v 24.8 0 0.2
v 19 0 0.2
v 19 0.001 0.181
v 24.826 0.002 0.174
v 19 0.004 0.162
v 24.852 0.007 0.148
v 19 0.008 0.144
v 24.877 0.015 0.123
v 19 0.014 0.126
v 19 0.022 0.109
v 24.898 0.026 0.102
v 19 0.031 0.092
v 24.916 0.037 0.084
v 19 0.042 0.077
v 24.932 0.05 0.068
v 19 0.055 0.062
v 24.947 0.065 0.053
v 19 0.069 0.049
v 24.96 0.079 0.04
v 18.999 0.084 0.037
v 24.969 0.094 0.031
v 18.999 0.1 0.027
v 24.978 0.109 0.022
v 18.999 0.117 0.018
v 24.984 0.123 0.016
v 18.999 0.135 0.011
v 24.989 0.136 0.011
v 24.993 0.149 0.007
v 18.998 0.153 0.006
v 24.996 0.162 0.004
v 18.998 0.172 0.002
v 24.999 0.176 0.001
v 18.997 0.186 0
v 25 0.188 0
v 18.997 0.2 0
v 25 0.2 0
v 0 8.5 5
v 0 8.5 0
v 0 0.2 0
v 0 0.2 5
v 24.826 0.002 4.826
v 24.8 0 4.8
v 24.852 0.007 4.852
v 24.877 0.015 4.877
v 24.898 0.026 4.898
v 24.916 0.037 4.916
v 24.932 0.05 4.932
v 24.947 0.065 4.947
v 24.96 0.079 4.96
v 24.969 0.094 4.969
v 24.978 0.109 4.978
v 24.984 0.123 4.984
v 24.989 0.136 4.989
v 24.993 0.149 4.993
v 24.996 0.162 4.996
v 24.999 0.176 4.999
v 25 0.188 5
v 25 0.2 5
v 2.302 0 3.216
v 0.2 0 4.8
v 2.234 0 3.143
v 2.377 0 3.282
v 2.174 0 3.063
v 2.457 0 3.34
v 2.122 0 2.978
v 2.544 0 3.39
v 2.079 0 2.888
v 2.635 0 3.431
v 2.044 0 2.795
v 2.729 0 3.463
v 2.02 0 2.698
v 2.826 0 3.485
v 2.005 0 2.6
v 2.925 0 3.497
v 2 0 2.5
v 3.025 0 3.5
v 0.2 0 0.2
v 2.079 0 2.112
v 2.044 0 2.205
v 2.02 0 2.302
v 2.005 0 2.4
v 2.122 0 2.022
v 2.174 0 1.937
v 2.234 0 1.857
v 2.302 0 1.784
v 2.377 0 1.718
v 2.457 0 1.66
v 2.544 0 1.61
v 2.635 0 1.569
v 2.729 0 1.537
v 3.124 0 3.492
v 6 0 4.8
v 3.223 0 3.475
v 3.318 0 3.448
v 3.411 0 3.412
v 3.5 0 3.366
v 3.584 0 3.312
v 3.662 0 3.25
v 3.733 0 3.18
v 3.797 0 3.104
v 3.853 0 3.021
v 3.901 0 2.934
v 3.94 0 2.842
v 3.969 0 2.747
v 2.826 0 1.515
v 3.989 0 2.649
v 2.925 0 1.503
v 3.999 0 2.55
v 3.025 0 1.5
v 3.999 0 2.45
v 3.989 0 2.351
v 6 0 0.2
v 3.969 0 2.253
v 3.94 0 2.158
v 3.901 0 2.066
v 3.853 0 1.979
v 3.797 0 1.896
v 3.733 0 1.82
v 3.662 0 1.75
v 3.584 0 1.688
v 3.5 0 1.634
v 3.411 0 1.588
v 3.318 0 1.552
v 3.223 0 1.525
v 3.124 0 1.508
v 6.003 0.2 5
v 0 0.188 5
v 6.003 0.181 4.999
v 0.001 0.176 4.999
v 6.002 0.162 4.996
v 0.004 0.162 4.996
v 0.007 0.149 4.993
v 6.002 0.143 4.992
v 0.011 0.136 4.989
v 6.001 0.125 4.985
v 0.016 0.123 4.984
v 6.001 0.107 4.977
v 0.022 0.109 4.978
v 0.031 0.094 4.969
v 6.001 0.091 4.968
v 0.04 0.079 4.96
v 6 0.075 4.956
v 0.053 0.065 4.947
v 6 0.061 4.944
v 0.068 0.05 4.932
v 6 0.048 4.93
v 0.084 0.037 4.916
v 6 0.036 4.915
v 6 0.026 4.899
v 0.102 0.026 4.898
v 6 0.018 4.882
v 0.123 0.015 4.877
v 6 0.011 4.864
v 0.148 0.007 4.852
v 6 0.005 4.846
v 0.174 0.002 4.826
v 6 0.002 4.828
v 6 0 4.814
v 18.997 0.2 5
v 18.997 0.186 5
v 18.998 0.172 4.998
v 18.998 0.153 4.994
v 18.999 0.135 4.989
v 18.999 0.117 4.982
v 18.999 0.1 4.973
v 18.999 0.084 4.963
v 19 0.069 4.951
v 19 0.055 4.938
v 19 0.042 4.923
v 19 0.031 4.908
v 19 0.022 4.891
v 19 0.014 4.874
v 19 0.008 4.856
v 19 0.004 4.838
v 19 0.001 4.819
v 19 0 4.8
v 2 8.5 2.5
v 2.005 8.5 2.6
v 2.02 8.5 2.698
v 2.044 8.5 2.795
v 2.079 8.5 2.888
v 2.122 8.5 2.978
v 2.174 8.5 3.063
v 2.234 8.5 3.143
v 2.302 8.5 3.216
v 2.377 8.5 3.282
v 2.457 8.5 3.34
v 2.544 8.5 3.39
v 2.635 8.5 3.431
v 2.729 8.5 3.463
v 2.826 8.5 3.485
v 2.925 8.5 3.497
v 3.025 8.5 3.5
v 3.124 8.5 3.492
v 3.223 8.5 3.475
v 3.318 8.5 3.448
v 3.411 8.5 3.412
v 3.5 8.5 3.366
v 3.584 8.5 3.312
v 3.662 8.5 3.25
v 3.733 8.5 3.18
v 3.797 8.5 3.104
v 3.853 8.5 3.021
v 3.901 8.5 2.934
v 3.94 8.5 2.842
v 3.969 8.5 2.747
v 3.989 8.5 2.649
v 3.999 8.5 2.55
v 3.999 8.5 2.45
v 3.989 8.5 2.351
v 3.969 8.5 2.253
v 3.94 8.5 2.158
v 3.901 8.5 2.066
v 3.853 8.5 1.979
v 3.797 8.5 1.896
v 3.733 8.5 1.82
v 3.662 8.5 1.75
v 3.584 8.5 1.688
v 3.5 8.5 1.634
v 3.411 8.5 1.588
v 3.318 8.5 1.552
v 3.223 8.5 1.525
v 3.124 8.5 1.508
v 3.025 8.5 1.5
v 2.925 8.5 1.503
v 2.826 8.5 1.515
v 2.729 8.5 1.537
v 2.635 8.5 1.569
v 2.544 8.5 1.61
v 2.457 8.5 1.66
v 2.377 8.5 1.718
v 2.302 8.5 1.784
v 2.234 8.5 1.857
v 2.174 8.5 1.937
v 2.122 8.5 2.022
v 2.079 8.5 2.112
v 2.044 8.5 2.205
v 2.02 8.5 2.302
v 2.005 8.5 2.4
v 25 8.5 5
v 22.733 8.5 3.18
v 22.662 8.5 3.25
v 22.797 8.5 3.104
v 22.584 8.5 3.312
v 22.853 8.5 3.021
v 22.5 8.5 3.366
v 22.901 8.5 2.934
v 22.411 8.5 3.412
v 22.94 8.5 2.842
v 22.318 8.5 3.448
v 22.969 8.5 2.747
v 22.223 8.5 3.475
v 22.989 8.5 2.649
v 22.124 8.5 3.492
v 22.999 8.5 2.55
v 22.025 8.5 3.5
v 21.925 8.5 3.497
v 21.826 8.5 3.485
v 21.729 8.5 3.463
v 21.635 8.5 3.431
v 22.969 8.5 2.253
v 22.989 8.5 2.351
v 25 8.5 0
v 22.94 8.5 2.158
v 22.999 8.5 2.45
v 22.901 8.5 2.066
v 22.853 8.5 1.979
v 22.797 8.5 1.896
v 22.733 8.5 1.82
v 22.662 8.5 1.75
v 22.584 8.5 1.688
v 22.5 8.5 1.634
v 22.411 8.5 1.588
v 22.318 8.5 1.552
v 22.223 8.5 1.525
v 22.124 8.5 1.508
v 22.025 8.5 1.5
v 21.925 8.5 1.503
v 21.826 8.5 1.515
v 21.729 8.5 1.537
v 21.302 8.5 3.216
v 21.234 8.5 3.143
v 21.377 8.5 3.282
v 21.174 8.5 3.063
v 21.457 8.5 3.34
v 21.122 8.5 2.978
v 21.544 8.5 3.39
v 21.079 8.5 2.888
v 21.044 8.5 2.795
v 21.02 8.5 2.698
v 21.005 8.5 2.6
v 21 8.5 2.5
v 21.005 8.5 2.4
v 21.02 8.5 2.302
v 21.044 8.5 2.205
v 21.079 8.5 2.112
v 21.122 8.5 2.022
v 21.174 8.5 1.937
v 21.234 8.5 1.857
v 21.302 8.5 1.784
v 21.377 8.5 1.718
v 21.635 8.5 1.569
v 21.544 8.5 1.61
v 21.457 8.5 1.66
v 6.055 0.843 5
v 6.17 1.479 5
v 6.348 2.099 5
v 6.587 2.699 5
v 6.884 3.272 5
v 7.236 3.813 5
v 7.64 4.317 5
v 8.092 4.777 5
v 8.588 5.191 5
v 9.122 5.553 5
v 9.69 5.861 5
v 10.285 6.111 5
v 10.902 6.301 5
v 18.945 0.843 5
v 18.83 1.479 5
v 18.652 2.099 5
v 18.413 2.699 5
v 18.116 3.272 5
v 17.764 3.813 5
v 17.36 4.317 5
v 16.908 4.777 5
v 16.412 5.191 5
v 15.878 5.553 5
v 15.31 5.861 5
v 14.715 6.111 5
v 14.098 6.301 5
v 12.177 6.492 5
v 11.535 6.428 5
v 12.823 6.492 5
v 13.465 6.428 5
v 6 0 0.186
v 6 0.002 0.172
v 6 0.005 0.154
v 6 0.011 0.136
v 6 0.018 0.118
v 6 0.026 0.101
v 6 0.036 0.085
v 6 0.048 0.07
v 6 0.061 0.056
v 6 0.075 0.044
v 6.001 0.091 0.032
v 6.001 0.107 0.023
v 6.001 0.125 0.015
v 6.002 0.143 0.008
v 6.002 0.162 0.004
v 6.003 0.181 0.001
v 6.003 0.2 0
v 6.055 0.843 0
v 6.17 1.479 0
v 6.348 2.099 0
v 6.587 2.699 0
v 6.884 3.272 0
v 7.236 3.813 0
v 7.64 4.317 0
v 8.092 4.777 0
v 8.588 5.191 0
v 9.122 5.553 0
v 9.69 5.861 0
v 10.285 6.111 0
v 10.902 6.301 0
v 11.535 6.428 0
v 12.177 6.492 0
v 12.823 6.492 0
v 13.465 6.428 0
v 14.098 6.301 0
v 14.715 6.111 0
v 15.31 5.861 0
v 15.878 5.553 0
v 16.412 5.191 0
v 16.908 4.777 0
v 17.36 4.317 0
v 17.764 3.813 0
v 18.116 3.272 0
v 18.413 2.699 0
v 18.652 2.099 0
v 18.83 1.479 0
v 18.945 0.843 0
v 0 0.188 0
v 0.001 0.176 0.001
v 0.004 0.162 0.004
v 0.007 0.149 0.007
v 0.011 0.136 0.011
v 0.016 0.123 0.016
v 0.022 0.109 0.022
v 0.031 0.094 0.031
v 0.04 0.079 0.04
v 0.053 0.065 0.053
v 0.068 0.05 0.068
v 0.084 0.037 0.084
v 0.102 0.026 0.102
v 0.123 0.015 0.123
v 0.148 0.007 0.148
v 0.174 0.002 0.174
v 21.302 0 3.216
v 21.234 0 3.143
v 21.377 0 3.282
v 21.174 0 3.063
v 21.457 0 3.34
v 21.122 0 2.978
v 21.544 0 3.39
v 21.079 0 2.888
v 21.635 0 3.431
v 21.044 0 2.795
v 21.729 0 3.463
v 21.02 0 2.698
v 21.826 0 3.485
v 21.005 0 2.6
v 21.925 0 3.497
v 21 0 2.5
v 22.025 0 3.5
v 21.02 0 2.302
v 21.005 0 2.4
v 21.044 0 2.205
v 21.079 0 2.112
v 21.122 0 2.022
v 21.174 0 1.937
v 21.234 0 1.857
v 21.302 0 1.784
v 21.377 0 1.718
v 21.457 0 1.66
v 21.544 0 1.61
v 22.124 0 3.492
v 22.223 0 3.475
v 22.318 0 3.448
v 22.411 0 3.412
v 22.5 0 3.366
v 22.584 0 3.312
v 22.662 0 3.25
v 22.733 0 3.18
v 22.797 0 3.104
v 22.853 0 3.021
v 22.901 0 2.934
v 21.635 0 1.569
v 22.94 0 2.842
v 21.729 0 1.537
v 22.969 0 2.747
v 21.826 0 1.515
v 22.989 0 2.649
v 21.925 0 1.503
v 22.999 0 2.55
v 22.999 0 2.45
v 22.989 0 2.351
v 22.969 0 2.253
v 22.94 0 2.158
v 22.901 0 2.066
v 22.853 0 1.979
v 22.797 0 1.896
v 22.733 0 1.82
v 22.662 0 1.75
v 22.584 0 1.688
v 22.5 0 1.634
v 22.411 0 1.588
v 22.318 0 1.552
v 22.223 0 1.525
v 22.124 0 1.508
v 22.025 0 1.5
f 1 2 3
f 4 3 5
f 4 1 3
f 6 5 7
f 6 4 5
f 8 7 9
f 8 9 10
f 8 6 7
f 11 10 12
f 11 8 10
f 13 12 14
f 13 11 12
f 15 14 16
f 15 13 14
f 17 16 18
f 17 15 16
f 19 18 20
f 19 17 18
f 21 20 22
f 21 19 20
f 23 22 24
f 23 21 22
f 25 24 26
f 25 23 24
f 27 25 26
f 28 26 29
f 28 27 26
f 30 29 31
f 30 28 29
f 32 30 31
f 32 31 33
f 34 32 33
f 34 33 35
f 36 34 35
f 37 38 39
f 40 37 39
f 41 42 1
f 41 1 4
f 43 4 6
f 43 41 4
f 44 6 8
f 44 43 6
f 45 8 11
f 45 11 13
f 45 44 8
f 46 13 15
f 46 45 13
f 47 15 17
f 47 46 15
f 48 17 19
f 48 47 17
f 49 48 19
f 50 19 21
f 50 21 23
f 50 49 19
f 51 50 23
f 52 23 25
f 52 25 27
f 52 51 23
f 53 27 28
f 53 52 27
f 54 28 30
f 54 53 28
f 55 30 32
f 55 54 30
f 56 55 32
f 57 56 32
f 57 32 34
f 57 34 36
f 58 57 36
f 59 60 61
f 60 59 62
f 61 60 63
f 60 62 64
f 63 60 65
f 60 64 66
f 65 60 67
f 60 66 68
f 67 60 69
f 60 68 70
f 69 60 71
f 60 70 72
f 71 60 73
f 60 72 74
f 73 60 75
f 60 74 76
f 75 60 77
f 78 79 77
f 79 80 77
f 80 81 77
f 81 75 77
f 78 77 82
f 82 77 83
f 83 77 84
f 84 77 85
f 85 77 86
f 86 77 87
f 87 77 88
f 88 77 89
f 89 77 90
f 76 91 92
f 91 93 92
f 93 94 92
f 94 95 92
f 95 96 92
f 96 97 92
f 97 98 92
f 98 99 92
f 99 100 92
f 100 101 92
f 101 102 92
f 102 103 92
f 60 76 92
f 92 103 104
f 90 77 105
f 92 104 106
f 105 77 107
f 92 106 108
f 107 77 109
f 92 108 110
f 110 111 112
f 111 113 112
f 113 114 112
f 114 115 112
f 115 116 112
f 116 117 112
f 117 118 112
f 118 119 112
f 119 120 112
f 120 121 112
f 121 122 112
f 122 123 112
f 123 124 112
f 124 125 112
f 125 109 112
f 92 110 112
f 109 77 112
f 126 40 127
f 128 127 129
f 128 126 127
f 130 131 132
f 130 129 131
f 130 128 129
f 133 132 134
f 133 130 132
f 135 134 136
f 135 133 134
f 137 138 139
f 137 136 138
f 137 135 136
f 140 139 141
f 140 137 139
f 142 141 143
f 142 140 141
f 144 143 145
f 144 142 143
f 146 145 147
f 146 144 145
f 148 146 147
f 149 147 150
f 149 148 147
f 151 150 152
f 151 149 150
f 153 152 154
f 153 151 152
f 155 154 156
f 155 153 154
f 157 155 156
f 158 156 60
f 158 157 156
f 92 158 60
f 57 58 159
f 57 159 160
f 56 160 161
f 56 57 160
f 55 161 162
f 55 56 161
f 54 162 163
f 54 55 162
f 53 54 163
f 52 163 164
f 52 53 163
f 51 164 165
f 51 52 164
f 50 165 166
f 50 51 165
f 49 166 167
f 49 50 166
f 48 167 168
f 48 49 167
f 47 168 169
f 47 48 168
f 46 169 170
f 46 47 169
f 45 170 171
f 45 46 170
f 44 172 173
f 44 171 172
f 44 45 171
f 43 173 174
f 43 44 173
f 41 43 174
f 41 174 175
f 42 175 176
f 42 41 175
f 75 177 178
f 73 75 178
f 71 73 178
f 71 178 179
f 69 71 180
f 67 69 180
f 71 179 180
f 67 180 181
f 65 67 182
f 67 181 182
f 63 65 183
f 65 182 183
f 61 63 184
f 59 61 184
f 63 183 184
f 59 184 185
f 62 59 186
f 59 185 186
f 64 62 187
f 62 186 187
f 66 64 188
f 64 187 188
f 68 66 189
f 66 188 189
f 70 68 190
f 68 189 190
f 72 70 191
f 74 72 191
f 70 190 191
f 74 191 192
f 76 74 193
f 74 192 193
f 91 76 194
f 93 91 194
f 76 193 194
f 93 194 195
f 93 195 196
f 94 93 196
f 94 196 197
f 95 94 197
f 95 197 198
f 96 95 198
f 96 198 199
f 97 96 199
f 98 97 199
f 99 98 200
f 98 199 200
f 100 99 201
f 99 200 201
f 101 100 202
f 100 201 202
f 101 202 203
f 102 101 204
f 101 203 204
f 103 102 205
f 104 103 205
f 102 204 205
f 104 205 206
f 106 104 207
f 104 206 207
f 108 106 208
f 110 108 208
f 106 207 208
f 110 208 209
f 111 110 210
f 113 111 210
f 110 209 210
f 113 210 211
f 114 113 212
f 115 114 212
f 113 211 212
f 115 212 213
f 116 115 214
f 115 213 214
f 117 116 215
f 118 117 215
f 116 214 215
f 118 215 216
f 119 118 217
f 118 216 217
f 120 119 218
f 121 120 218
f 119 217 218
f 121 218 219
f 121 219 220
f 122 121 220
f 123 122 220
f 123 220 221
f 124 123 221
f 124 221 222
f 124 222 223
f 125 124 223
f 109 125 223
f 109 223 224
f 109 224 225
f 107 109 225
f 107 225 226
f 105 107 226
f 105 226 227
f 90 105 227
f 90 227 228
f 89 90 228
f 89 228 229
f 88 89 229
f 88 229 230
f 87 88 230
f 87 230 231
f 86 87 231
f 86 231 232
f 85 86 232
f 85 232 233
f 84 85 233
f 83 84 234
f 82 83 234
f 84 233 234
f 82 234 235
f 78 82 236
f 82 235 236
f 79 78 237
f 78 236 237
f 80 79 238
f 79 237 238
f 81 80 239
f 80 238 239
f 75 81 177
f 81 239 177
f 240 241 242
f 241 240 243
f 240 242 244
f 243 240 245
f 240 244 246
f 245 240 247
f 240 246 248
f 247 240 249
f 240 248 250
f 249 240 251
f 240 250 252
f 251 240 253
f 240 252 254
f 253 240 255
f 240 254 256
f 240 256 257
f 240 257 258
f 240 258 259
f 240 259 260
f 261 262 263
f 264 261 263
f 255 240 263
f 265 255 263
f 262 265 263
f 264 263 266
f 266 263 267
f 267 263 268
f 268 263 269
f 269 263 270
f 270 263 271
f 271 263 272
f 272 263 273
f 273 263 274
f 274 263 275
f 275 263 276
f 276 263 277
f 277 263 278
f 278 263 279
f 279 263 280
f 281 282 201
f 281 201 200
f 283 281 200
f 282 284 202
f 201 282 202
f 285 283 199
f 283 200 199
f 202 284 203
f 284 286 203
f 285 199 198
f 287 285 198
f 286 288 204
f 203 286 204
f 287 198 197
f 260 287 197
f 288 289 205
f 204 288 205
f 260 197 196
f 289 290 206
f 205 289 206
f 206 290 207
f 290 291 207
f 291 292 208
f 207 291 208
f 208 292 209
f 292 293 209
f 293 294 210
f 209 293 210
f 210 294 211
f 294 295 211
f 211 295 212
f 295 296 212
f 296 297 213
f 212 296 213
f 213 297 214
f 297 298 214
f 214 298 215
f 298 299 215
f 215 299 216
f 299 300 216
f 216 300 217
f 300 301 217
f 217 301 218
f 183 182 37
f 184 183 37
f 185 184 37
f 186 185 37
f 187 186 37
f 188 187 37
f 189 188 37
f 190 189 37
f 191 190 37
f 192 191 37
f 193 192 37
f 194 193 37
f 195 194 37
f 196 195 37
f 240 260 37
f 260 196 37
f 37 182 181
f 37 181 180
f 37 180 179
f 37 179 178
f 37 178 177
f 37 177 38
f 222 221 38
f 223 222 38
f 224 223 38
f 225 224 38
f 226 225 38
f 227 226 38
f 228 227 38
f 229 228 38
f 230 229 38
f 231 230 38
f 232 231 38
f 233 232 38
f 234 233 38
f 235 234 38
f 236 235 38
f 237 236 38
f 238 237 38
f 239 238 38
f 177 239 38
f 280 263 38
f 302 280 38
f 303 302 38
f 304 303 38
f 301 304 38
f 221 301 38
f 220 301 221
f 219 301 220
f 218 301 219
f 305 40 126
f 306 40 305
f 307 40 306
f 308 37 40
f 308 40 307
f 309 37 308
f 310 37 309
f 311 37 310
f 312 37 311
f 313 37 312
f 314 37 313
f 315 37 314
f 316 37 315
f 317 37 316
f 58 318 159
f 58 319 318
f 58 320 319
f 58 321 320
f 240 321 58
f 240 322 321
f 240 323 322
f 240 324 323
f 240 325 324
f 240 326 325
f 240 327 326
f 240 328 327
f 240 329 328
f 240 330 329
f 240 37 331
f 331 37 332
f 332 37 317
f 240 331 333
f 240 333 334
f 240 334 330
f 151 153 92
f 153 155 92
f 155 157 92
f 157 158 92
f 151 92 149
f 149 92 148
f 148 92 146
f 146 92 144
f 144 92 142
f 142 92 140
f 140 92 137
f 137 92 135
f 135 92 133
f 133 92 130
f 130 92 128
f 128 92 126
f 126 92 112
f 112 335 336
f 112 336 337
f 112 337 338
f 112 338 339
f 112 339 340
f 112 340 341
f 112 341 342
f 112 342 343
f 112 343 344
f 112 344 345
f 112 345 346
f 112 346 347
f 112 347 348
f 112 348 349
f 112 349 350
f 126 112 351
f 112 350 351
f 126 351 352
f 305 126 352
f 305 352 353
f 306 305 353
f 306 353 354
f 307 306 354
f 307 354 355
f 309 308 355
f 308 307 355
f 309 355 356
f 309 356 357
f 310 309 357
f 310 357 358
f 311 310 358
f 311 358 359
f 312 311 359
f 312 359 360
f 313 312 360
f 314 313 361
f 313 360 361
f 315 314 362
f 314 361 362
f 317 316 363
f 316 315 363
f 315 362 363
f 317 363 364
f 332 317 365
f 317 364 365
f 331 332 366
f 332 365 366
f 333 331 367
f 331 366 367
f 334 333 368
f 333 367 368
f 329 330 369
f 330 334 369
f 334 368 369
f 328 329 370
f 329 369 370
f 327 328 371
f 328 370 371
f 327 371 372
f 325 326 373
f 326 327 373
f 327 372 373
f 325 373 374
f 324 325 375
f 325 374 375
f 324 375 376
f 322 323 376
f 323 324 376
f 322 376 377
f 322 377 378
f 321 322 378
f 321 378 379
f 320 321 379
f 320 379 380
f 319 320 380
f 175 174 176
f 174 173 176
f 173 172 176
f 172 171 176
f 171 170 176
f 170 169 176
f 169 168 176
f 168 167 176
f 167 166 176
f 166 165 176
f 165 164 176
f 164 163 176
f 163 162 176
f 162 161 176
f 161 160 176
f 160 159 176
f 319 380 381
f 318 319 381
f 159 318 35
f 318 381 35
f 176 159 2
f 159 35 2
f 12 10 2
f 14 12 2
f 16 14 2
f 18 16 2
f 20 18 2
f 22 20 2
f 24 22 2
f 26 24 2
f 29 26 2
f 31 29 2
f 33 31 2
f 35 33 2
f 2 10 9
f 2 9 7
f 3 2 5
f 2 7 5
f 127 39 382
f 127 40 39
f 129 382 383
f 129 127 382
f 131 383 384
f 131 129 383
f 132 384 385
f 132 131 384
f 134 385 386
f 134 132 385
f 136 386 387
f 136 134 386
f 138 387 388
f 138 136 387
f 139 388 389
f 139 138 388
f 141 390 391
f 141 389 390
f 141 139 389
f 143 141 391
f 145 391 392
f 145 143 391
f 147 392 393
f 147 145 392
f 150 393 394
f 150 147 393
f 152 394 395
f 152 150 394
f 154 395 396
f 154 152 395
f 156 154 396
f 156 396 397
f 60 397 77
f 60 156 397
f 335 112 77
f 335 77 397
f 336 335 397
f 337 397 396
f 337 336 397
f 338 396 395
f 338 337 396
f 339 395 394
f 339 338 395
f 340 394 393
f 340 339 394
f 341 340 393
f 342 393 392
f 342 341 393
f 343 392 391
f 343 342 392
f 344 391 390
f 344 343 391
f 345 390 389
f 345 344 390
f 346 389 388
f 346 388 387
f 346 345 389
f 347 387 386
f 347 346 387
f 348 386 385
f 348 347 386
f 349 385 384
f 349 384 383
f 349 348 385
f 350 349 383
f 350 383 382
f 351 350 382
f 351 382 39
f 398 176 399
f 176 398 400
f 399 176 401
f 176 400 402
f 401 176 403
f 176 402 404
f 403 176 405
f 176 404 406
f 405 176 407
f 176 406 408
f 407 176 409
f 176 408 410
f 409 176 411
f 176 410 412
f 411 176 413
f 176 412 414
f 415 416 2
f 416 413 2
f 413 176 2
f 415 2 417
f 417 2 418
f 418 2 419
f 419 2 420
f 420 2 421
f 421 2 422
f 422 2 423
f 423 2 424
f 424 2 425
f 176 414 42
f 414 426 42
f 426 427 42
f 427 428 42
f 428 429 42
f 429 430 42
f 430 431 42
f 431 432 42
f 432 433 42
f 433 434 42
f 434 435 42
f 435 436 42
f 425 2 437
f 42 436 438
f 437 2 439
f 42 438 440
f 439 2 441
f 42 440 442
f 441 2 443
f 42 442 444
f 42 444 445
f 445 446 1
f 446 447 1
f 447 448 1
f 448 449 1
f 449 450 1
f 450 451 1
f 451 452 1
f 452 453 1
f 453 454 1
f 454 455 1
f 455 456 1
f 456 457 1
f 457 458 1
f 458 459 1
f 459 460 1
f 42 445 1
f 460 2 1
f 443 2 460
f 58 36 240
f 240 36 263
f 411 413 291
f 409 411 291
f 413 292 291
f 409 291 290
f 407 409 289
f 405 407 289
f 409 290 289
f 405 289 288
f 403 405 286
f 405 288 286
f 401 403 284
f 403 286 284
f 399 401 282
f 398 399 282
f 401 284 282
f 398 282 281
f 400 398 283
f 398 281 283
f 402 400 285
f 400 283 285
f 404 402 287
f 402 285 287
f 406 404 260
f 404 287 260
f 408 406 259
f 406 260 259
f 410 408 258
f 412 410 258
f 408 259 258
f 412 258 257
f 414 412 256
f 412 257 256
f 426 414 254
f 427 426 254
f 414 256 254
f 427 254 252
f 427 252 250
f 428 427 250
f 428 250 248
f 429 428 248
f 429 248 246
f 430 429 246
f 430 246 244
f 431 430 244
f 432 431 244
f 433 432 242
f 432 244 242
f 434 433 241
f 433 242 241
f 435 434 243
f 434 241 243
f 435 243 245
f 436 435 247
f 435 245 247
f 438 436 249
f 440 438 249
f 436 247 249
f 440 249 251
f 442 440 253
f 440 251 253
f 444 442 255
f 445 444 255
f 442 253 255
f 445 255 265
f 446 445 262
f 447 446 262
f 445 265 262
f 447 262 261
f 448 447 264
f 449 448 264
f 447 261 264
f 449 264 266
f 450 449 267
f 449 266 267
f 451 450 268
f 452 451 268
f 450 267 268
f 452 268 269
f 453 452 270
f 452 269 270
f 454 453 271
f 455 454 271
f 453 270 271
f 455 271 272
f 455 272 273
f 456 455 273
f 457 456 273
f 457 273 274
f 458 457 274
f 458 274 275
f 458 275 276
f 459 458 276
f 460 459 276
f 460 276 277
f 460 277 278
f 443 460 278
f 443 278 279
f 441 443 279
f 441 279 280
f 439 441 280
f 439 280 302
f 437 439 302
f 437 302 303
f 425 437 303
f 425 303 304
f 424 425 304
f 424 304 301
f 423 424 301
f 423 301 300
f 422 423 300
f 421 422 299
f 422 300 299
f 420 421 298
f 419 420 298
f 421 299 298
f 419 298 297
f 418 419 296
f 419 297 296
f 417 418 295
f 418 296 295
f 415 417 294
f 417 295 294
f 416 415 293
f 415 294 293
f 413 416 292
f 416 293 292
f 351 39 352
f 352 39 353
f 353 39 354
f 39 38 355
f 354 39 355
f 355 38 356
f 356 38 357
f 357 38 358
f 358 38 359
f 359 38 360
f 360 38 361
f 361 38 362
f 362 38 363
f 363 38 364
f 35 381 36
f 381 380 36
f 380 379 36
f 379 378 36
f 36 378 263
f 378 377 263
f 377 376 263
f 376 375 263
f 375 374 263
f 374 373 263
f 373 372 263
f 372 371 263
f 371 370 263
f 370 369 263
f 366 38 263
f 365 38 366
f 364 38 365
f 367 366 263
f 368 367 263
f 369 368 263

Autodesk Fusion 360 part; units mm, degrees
sketch "Sketch1" plane through (0, 0, 0) normal (0, 0, 1) x (1, 0, 0)
  line L0 (25, 0) -> (25, 8.5)
  line L1 (25, 8.5) -> (0, 8.5)
  line L2 (0, 8.5) -> (0, 0)
  arc A0 (19, 0) -> (6, 0) centre (12.5, 0) ccw
  line L3 (0, 0) -> (6, 0)
  line L4 (19, 0) -> (25, 0)
  dimension "d1" = 25
  dimension "d2" = 8.5
  dimension "d3" = 13
extrude "Extrude1" add sketch "Sketch1" along normal blind 5
sketch "Sketch2" plane through (0, 8.5, 0) normal (0, 1, 0) x (-1, 0, 0)
  line L0 (-25, 0) -> (0, 0)
  line L1 (0, 0) -> (0, 5)
  line L2 (0, 5) -> (-25, 5)
  line L3 (-25, 5) -> (-25, 0)
  line L4 (-19, 0) -> (-19, 5)
  line L5 (-6, 0) -> (-6, 5)
  line L6 (0, 5) -> (-6, 0) construction
  line L7 (-12.5, 0) -> (-12.5, 5)
  circle A0 centre (-3, 2.5) radius 1
  circle A1 centre (-22, 2.5) radius 1
  dimension "d6" = 2
extrude "Extrude2" cut sketch "Sketch2" against normal through all contours A0 | A1
fillet "Fillet1" radius 0.2 6 edges at (0, 0, 2.5) (3, 0, 0) (3, 0, 5) (22, 0, 5) (25, 0, 2.5) (22, 0, 0)
